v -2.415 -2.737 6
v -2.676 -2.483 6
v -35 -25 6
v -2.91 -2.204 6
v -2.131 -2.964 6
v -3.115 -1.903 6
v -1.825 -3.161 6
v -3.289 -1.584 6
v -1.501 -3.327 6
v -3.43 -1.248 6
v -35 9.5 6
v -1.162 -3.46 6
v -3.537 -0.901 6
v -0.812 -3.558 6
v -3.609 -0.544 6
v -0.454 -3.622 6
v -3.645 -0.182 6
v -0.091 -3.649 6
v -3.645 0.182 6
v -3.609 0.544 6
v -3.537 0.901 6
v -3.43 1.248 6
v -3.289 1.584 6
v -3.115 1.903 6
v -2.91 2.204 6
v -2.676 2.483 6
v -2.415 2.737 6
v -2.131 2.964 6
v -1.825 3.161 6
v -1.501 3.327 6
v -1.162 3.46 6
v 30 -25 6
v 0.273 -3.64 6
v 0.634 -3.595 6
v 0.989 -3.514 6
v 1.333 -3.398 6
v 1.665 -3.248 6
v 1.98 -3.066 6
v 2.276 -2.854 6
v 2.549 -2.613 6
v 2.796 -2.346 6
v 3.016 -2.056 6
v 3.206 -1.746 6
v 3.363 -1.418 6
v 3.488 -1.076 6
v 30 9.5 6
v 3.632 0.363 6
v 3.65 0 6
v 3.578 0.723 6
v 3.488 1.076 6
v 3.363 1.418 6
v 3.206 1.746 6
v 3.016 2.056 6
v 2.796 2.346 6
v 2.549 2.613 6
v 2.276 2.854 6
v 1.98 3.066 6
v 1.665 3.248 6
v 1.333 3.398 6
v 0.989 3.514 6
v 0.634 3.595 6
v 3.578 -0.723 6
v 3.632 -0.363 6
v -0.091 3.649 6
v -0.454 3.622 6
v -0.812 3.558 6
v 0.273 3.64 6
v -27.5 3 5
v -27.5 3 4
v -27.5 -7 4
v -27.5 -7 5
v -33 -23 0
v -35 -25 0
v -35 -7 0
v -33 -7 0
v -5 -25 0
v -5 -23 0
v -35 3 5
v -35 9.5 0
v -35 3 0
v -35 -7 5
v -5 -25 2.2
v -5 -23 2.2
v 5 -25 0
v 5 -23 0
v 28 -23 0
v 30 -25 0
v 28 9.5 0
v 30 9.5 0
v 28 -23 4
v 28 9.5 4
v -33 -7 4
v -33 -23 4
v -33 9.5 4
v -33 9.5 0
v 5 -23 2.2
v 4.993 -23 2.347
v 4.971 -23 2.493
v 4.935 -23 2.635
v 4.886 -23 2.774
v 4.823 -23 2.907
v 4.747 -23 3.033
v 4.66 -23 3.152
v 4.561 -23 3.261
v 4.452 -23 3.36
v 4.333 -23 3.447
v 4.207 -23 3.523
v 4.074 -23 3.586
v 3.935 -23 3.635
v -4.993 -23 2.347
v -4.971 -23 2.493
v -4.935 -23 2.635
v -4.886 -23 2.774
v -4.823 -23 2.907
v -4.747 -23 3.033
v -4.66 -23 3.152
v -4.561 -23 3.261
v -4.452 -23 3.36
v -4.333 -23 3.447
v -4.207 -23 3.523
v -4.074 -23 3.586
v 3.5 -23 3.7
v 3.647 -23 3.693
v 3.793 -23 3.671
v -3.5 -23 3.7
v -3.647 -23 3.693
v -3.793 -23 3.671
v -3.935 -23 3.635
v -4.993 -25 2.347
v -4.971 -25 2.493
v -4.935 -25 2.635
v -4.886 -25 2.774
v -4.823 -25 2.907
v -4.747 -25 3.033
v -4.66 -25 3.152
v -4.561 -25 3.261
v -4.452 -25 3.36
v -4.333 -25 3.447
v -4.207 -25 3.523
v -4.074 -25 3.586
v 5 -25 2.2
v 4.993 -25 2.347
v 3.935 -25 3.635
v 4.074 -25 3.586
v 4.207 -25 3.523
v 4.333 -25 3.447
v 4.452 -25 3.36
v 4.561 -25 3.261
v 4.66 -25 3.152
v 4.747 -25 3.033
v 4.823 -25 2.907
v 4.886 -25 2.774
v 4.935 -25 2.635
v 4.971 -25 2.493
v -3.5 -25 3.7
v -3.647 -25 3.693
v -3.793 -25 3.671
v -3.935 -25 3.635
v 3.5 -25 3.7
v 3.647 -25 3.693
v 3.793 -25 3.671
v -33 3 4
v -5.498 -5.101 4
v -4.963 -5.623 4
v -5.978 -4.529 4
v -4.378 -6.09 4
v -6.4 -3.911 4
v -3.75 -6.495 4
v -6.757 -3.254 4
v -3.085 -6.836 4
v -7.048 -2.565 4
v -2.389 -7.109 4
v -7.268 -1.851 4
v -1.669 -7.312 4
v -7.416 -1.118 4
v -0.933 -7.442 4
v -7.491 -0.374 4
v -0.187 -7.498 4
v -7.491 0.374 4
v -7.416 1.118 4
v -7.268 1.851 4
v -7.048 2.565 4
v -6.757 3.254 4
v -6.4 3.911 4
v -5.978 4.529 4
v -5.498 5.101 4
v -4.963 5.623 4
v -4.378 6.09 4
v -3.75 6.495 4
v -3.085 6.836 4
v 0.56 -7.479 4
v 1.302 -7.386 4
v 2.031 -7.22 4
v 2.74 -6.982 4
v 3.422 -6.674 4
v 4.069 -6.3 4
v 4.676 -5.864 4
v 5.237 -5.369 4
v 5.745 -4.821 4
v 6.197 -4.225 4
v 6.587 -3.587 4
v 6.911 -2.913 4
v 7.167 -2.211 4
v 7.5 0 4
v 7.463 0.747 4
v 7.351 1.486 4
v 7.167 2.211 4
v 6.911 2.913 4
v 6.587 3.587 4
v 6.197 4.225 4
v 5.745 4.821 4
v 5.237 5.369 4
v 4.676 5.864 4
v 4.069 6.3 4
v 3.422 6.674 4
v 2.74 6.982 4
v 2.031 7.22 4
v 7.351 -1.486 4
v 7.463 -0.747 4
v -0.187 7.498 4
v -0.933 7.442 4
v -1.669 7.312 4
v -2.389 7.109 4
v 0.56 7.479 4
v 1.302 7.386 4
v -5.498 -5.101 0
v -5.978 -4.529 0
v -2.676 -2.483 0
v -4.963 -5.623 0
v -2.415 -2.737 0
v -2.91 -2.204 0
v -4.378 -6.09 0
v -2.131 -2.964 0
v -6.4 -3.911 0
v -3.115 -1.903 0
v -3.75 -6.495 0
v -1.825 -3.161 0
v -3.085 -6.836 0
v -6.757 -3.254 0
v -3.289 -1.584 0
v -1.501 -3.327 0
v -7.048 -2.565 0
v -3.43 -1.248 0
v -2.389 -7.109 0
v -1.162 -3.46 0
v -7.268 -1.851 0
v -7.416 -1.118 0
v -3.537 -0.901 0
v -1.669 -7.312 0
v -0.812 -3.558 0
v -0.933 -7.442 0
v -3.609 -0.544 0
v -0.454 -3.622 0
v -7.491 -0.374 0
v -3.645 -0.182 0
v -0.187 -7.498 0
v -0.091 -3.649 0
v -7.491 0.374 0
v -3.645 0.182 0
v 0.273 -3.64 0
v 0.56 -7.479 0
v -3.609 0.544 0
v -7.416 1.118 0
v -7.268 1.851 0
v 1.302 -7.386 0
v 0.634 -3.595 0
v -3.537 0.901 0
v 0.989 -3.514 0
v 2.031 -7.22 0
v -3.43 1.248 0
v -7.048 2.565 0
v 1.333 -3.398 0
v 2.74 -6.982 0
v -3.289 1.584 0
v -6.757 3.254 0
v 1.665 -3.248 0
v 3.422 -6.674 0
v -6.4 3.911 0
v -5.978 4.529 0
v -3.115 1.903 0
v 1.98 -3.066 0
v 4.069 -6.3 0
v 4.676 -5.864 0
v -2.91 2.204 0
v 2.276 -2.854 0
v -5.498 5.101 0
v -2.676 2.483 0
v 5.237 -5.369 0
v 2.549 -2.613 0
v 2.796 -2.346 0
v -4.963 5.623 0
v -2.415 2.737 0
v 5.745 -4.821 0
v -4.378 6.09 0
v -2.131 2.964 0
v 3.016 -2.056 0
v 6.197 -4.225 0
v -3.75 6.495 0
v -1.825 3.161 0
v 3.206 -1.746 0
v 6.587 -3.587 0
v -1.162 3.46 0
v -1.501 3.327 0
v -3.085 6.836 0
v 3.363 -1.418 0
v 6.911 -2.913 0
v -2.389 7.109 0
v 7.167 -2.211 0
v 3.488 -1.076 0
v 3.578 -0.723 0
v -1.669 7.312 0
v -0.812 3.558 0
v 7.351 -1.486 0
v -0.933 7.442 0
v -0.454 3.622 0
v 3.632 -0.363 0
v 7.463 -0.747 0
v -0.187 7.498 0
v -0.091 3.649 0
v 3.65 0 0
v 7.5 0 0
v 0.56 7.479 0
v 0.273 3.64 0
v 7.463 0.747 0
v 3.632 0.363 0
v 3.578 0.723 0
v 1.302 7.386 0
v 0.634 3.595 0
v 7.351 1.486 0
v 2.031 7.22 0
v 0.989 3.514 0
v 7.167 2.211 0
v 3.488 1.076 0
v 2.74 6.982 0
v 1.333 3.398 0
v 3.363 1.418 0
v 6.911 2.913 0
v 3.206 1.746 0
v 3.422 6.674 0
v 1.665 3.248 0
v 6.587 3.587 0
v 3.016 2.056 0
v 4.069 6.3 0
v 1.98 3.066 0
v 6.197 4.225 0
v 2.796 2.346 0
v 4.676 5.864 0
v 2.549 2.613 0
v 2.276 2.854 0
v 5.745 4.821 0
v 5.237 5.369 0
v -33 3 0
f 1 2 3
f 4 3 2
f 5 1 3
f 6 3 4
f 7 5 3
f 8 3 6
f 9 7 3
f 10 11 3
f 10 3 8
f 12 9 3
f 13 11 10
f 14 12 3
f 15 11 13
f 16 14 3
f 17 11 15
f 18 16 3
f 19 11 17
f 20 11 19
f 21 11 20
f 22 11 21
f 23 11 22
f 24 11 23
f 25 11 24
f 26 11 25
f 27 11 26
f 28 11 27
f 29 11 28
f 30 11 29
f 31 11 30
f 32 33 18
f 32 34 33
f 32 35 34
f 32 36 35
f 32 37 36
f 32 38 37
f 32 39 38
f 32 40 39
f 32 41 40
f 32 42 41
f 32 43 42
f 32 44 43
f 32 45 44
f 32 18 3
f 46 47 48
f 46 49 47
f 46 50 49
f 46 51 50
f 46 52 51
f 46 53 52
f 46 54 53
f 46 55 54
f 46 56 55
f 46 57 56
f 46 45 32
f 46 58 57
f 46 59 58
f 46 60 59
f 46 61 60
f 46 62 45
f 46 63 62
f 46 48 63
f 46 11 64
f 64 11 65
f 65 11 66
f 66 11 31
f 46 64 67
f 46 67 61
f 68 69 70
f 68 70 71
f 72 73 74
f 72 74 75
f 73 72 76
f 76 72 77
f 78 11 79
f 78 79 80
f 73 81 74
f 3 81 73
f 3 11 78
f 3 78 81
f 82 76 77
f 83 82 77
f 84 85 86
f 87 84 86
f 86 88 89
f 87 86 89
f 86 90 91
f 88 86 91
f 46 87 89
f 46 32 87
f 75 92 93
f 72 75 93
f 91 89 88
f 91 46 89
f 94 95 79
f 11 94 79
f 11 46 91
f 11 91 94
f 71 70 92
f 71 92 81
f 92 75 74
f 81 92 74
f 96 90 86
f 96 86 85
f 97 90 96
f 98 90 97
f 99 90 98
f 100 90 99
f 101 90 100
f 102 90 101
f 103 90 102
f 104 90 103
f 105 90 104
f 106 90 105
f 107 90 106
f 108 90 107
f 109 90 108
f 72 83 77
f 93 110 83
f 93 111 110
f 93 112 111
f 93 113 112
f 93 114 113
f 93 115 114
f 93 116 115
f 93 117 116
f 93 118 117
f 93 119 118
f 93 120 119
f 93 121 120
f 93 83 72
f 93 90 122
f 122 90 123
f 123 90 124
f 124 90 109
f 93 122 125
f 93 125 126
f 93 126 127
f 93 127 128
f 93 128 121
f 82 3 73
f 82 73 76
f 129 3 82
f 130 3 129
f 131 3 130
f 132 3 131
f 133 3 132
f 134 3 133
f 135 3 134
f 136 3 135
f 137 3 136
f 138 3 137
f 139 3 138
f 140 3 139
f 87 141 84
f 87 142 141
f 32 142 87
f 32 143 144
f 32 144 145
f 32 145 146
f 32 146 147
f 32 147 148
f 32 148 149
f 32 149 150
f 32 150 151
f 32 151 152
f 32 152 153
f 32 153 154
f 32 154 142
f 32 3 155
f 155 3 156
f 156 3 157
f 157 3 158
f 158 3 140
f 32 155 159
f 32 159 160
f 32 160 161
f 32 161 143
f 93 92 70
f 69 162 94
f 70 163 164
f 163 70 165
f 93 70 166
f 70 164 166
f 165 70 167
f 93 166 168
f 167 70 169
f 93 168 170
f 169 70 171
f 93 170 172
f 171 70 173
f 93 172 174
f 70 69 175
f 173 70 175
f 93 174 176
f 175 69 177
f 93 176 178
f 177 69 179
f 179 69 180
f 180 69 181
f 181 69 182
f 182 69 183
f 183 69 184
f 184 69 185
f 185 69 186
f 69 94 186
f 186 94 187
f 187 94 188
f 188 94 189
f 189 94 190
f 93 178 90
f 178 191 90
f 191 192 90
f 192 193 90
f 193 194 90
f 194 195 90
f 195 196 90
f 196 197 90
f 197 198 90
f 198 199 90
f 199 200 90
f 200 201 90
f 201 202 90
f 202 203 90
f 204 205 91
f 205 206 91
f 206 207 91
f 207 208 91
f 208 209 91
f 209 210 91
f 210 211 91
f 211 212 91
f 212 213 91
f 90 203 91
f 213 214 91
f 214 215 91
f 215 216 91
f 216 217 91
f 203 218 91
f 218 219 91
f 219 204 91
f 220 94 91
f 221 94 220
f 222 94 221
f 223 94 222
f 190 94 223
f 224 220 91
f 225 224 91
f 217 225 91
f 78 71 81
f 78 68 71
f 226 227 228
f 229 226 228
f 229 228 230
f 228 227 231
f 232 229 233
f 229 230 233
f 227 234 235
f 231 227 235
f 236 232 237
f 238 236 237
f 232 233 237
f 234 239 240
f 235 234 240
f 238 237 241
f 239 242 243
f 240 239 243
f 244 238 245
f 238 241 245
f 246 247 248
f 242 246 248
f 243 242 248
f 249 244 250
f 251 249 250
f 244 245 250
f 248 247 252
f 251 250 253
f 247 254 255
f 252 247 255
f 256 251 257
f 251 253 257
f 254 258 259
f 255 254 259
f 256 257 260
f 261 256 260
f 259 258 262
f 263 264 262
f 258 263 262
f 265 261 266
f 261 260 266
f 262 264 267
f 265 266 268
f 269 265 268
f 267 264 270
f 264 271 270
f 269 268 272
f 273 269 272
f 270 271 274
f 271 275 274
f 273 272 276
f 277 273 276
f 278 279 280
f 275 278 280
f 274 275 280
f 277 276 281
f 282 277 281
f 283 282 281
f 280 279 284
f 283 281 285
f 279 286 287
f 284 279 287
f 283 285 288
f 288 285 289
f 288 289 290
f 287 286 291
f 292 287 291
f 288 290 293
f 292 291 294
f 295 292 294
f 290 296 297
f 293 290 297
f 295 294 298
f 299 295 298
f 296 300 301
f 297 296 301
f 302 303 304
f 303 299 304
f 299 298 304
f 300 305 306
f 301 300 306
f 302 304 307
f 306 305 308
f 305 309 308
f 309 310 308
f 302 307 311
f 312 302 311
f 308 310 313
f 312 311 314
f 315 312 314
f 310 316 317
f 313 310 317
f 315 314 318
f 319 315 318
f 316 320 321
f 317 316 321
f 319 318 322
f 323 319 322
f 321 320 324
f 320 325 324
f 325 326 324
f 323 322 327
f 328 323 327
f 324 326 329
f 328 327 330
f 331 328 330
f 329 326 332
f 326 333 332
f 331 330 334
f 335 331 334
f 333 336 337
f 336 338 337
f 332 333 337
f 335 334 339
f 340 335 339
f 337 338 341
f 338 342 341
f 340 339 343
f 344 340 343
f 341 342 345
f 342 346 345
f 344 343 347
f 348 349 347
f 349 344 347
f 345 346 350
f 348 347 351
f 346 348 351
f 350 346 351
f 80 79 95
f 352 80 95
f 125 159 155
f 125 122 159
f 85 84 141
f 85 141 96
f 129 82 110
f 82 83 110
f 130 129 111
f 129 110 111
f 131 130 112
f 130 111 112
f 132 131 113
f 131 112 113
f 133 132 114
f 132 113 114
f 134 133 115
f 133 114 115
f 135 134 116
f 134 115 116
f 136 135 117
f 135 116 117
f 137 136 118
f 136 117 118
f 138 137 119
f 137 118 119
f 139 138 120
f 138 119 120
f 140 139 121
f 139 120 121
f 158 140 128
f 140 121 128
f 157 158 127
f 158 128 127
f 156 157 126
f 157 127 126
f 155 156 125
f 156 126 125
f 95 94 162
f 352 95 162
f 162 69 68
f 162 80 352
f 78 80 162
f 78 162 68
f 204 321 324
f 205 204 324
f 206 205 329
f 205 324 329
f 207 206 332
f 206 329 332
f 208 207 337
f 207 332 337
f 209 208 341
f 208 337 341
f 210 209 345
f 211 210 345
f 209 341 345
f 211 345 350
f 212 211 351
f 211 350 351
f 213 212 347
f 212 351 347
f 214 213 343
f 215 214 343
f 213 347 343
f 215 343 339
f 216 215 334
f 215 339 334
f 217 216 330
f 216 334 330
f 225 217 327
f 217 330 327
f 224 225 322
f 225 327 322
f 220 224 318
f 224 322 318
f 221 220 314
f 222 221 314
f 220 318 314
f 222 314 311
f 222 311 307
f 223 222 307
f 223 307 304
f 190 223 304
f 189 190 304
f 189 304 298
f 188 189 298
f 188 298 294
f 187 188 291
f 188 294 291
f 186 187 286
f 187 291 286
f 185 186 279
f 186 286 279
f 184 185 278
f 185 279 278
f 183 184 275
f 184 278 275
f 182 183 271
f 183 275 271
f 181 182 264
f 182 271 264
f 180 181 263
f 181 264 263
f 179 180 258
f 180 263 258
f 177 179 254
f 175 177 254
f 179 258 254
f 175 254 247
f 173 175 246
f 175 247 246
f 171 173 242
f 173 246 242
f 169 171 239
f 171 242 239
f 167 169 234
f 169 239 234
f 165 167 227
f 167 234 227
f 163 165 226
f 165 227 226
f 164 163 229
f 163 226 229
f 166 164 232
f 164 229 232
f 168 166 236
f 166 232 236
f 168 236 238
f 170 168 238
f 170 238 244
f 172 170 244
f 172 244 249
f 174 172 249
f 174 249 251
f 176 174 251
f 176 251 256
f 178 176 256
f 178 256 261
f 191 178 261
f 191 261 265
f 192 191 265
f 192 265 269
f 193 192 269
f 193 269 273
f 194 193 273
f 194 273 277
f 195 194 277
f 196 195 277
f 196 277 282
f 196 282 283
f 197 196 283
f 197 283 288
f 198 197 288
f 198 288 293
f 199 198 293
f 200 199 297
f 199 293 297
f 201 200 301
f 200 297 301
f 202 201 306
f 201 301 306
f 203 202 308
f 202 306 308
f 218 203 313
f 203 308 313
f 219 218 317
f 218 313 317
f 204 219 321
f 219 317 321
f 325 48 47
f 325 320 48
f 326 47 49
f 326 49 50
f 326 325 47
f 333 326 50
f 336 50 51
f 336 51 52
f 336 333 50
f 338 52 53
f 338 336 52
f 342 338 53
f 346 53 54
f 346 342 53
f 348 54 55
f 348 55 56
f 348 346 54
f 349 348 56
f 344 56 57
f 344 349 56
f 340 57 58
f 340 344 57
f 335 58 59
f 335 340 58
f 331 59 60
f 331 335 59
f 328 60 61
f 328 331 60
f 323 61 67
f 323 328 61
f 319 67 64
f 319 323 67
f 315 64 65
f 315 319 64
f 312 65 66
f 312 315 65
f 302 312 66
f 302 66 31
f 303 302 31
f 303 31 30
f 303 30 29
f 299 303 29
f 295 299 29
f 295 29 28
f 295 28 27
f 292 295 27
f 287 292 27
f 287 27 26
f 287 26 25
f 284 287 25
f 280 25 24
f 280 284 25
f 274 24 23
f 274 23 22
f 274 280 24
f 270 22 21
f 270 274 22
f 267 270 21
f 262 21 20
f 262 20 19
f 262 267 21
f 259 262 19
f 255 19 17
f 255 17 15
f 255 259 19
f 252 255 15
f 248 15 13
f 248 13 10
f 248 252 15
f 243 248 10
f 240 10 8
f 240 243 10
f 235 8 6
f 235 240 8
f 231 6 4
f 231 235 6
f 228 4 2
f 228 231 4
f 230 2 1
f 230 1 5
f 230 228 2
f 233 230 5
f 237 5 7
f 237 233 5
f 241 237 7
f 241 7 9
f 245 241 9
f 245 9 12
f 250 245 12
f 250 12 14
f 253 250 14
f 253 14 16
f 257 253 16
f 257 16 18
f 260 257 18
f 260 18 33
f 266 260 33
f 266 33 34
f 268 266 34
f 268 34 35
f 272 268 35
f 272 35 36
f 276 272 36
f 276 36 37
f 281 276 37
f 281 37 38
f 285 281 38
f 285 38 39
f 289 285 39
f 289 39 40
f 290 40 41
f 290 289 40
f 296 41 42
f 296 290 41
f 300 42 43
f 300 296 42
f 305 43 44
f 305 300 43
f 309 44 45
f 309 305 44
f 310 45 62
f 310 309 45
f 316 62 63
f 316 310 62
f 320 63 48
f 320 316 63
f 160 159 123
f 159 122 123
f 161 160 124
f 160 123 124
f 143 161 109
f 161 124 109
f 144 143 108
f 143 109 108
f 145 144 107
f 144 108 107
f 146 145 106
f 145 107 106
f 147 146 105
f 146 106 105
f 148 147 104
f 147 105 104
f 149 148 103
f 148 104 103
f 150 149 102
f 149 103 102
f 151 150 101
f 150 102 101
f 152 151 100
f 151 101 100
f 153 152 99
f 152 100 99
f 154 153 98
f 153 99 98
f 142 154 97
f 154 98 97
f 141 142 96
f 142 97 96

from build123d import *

# Parameters (mm, degrees)
SKETCH_2_R          = 7.5
SKETCH_2_R_2        = 3.65
EXTRUDE_1_DEPTH     = 4
SKETCH_3_W          = 65
SKETCH_3_H          = 34.5
SKETCH_3_R          = 3.65
EXTRUDE_2_DEPTH     = 2
EXTRUDE_3_DEPTH     = 4
SKETCH_5_W          = 10
SKETCH_5_H          = 2
CUT_EXTRUDE_1_DEPTH = 3.7
FILLET_1_R          = 1.5
SKETCH_6_W          = 2
SKETCH_6_H          = 10
CUT_EXTRUDE_2_DEPTH = 5
SKETCH_7_W          = 1
SKETCH_7_H          = 10
CUT_EXTRUDE_3_DEPTH = 5.5


with BuildPart() as part:
    # 草图2 → 凸台-拉伸1 (new body)
    with BuildSketch(Plane.XY):
        Circle(SKETCH_2_R)
        Circle(SKETCH_2_R_2, mode=Mode.SUBTRACT)
    extrude(amount=EXTRUDE_1_DEPTH)

    # 草图3 → 凸台-拉伸2 (add)
    with BuildSketch(Plane.XY.offset(4)):
        with Locations((-2.5, -7.75)):
            Rectangle(SKETCH_3_W, SKETCH_3_H)
        Circle(SKETCH_3_R, mode=Mode.SUBTRACT)
    extrude(amount=EXTRUDE_2_DEPTH)

    # 草图4 → 凸台-拉伸3 (add)
    with BuildSketch(Plane(origin=(0, 0, 4), x_dir=(-1, 0, 0), z_dir=(0, 0, -1))):
        Polygon((-28, 7.5), (-28, -23), (33, -23), (33, 7.5), (33, 9.5), (35, 9.5), (35, -25), (-30, -25), (-30, 9.5), (-28, 9.5), align=None)
    extrude(amount=EXTRUDE_3_DEPTH)

    # 草图5 → 切除-拉伸1 (cut)
    with BuildSketch(Plane(origin=(0, 0, 0), x_dir=(-1, 0, 0), z_dir=(0, 0, -1))):
        with Locations((0, -24)):
            Rectangle(SKETCH_5_W, SKETCH_5_H)
    extrude(amount=-CUT_EXTRUDE_1_DEPTH, mode=Mode.SUBTRACT)

    # 圆角1
    fillet_1_edges = [part.edges().sort_by_distance(p)[0] for p in [
        (5, -24, 3.7),
        (-5, -24, 3.7),
    ]]
    fillet(fillet_1_edges, radius=FILLET_1_R)

    # 草图6 → 切除-拉伸2 (cut)
    with BuildSketch(Plane(origin=(0, 0, 0), x_dir=(-1, 0, 0), z_dir=(0, 0, -1))):
        with Locations((34, -2)):
            Rectangle(SKETCH_6_W, SKETCH_6_H)
    extrude(amount=-CUT_EXTRUDE_2_DEPTH, mode=Mode.SUBTRACT)

    # 草图7 → 切除-拉伸3 (cut)
    with BuildSketch(Plane.ZY.offset(33)):
        with Locations((4.5, -2)):
            Rectangle(SKETCH_7_W, SKETCH_7_H)
    extrude(amount=-CUT_EXTRUDE_3_DEPTH, mode=Mode.SUBTRACT)


solid = part.part
